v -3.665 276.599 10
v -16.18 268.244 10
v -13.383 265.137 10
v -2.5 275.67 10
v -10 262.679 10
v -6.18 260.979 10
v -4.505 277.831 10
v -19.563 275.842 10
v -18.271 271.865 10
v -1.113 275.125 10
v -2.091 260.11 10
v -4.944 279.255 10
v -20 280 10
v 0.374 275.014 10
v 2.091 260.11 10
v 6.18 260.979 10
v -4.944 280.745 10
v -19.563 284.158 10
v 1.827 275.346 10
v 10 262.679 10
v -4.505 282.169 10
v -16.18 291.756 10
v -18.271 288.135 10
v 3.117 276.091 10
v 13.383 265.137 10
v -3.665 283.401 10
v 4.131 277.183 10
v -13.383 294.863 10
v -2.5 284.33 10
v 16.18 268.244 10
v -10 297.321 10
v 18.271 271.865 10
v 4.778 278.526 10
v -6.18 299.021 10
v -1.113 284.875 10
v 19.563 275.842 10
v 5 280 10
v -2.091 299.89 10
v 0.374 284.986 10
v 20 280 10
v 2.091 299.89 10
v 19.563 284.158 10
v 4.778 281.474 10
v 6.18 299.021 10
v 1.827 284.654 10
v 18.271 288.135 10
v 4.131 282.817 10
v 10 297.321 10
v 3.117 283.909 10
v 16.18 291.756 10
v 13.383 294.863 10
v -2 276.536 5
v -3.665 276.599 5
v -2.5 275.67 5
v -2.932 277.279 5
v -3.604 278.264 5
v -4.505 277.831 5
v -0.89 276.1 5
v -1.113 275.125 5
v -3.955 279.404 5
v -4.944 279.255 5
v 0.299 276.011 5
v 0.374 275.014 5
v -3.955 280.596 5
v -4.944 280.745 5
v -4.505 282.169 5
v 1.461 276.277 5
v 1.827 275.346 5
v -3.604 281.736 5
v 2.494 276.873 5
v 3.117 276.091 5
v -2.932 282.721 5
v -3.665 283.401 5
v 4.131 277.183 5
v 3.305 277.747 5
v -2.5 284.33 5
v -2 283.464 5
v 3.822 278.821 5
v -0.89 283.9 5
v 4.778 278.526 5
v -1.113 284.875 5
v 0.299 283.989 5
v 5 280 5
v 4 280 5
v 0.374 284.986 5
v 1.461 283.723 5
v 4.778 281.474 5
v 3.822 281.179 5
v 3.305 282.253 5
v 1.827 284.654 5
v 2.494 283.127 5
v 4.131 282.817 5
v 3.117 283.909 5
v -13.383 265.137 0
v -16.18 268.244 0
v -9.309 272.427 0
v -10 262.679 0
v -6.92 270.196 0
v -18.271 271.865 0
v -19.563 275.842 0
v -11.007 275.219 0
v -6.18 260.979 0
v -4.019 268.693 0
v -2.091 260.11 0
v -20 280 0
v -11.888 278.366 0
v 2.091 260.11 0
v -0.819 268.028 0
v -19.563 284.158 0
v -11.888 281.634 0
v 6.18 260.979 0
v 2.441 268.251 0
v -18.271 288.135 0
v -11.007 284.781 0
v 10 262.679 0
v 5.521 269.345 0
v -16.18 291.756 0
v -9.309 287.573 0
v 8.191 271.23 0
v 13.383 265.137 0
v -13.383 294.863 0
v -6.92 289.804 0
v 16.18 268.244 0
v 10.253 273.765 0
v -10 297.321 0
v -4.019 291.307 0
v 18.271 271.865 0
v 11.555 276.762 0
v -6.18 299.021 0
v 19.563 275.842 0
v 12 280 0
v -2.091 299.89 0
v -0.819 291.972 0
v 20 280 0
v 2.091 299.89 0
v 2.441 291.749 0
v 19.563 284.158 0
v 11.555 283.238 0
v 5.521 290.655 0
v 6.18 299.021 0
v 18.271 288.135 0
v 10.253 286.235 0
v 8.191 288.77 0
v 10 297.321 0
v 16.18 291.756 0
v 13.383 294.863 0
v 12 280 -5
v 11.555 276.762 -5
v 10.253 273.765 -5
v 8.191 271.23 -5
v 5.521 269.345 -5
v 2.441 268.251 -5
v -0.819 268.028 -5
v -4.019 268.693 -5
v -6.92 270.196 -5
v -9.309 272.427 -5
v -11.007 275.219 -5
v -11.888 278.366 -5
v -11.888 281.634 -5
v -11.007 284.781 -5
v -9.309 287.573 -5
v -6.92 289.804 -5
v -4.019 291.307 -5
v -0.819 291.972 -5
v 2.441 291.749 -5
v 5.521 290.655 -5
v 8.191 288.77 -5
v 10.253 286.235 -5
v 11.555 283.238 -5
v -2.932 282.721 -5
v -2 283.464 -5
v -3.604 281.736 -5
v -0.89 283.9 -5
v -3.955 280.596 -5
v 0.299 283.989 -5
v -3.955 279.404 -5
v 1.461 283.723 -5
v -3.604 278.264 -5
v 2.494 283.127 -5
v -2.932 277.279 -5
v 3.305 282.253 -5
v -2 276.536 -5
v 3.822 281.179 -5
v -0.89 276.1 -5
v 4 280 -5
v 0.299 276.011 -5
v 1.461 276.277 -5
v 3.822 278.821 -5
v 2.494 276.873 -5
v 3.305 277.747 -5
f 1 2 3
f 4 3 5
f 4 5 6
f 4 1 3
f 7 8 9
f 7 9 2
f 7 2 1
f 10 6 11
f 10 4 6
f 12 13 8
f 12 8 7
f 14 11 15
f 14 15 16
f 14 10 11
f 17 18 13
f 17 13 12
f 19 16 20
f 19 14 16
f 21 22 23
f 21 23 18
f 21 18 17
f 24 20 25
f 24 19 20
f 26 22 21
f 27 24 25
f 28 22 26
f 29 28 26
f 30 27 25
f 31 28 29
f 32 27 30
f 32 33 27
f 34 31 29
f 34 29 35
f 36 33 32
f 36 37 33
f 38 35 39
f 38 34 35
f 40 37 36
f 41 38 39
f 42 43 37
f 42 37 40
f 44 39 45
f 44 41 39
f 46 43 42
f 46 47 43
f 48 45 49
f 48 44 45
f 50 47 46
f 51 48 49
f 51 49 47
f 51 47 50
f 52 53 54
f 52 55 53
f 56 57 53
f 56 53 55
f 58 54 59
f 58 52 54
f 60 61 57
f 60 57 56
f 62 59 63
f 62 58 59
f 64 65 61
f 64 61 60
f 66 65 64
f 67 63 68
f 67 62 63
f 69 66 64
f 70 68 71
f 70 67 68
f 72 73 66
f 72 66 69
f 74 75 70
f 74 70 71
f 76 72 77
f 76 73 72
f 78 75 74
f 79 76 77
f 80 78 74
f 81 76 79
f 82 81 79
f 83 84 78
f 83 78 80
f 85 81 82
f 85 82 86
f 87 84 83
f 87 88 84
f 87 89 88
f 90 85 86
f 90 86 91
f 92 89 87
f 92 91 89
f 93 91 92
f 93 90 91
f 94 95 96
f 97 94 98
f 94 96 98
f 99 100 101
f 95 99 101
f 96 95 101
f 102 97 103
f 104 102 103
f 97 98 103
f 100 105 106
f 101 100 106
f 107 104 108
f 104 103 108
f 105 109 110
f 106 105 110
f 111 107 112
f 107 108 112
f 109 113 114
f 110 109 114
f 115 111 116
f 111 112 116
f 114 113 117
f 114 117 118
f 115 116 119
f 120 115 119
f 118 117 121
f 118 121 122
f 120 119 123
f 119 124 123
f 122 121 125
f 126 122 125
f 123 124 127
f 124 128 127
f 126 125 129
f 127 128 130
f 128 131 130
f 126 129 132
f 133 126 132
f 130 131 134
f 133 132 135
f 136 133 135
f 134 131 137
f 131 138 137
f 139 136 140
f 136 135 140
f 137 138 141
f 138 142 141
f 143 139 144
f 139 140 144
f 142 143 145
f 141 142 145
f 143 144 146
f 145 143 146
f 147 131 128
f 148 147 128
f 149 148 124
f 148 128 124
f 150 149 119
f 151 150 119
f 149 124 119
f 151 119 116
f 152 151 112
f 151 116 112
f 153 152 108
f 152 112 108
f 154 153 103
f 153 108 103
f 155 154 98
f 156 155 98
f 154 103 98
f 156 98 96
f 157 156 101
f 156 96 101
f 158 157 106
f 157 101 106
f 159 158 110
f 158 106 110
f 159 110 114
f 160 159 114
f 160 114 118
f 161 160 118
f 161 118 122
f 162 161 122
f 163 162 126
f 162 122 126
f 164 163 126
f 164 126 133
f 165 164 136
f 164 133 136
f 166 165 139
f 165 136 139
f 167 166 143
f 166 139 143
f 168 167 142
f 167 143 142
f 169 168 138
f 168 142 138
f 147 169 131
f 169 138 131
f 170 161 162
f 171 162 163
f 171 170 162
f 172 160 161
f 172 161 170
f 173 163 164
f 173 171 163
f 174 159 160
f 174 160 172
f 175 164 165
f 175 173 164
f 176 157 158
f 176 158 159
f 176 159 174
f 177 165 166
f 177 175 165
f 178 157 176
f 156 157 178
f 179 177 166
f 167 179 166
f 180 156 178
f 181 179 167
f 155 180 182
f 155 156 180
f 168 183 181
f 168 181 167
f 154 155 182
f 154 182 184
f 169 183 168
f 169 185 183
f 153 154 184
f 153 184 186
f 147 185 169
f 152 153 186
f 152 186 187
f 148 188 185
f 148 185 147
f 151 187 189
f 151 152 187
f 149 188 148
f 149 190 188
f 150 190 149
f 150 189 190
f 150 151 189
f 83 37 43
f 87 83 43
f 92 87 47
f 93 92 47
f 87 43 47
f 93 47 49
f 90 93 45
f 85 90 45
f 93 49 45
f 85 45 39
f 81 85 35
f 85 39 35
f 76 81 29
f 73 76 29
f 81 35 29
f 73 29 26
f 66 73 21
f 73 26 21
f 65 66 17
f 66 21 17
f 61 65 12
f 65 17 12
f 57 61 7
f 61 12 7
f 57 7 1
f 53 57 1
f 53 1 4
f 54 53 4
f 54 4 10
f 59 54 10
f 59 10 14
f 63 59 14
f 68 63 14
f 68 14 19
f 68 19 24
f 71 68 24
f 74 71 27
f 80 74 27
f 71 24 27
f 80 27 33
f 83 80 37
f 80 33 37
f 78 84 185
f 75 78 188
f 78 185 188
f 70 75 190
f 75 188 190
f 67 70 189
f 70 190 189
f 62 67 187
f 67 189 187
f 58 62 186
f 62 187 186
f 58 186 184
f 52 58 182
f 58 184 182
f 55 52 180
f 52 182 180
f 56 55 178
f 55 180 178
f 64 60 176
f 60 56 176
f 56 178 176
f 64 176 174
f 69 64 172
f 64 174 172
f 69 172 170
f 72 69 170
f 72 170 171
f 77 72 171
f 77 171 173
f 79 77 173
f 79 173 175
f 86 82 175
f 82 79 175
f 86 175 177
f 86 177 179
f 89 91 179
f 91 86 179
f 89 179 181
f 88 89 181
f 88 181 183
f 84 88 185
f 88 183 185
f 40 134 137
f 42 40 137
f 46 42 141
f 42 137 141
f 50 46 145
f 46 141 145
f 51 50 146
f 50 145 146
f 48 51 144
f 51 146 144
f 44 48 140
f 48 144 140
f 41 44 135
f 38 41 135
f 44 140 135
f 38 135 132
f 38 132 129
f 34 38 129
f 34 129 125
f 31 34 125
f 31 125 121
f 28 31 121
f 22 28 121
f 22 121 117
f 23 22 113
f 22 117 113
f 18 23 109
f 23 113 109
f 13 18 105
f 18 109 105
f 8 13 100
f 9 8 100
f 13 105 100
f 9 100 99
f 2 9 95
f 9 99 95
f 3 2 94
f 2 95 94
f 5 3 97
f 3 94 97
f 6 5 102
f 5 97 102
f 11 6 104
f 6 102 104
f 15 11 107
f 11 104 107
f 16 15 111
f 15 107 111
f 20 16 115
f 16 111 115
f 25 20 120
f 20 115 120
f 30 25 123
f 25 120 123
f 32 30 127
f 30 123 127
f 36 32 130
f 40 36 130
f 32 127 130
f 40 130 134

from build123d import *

# Parameters (mm, degrees)
ESQUISSE1_R             = 20
BOSS_EXTRU_1_DEPTH      = 10
ESQUISSE2_R             = 4
ENL_V_MAT_EXTRU_1_DEPTH = 11
ESQUISSE3_R             = 5
ENL_V_MAT_EXTRU_2_DEPTH = 5
ESQUISSE4_R             = 12
BOSS_EXTRU_2_DEPTH      = 5
ESQUISSE5_R             = 4
ENL_V_MAT_EXTRU_6_DEPTH = 16


with BuildPart() as part:
    # Esquisse1 → Boss.-Extru.1 (new body)
    with BuildSketch(Plane.XY):
        with Locations((0, 280)):
            Circle(ESQUISSE1_R)
    extrude(amount=BOSS_EXTRU_1_DEPTH)

    # Esquisse2 → Enlèv. mat.-Extru.1 (cut, through all)
    with BuildSketch(Plane.XY.offset(10)):
        with Locations((0, 280)):
            Circle(ESQUISSE2_R)
    extrude(amount=-ENL_V_MAT_EXTRU_1_DEPTH, mode=Mode.SUBTRACT)

    # Esquisse3 → Enlèv. mat.-Extru.2 (cut)
    with BuildSketch(Plane.XY.offset(10)):
        with Locations((0, 280)):
            Circle(ESQUISSE3_R)
    extrude(amount=-ENL_V_MAT_EXTRU_2_DEPTH, mode=Mode.SUBTRACT)

    # Esquisse4 → Boss.-Extru.2 (add)
    with BuildSketch(Plane(origin=(0, 0, 0), x_dir=(-1, 0, 0), z_dir=(0, 0, -1))):
        with Locations(Location((0, 280, 0), (0, 0, 180))):  # turned: the seam where the file's is
            Circle(ESQUISSE4_R)
    extrude(amount=BOSS_EXTRU_2_DEPTH)

    # Esquisse5 → Enlèv. mat.-Extru.6 (cut, through all)
    with BuildSketch(Plane(origin=(0, 0, -5), x_dir=(-1, 0, 0), z_dir=(0, 0, -1))):
        with Locations(Location((0, 280, 0), (0, 0, 180))):  # turned: the seam where the file's is
            Circle(ESQUISSE5_R)
    extrude(amount=-ENL_V_MAT_EXTRU_6_DEPTH, mode=Mode.SUBTRACT)


solid = part.part
